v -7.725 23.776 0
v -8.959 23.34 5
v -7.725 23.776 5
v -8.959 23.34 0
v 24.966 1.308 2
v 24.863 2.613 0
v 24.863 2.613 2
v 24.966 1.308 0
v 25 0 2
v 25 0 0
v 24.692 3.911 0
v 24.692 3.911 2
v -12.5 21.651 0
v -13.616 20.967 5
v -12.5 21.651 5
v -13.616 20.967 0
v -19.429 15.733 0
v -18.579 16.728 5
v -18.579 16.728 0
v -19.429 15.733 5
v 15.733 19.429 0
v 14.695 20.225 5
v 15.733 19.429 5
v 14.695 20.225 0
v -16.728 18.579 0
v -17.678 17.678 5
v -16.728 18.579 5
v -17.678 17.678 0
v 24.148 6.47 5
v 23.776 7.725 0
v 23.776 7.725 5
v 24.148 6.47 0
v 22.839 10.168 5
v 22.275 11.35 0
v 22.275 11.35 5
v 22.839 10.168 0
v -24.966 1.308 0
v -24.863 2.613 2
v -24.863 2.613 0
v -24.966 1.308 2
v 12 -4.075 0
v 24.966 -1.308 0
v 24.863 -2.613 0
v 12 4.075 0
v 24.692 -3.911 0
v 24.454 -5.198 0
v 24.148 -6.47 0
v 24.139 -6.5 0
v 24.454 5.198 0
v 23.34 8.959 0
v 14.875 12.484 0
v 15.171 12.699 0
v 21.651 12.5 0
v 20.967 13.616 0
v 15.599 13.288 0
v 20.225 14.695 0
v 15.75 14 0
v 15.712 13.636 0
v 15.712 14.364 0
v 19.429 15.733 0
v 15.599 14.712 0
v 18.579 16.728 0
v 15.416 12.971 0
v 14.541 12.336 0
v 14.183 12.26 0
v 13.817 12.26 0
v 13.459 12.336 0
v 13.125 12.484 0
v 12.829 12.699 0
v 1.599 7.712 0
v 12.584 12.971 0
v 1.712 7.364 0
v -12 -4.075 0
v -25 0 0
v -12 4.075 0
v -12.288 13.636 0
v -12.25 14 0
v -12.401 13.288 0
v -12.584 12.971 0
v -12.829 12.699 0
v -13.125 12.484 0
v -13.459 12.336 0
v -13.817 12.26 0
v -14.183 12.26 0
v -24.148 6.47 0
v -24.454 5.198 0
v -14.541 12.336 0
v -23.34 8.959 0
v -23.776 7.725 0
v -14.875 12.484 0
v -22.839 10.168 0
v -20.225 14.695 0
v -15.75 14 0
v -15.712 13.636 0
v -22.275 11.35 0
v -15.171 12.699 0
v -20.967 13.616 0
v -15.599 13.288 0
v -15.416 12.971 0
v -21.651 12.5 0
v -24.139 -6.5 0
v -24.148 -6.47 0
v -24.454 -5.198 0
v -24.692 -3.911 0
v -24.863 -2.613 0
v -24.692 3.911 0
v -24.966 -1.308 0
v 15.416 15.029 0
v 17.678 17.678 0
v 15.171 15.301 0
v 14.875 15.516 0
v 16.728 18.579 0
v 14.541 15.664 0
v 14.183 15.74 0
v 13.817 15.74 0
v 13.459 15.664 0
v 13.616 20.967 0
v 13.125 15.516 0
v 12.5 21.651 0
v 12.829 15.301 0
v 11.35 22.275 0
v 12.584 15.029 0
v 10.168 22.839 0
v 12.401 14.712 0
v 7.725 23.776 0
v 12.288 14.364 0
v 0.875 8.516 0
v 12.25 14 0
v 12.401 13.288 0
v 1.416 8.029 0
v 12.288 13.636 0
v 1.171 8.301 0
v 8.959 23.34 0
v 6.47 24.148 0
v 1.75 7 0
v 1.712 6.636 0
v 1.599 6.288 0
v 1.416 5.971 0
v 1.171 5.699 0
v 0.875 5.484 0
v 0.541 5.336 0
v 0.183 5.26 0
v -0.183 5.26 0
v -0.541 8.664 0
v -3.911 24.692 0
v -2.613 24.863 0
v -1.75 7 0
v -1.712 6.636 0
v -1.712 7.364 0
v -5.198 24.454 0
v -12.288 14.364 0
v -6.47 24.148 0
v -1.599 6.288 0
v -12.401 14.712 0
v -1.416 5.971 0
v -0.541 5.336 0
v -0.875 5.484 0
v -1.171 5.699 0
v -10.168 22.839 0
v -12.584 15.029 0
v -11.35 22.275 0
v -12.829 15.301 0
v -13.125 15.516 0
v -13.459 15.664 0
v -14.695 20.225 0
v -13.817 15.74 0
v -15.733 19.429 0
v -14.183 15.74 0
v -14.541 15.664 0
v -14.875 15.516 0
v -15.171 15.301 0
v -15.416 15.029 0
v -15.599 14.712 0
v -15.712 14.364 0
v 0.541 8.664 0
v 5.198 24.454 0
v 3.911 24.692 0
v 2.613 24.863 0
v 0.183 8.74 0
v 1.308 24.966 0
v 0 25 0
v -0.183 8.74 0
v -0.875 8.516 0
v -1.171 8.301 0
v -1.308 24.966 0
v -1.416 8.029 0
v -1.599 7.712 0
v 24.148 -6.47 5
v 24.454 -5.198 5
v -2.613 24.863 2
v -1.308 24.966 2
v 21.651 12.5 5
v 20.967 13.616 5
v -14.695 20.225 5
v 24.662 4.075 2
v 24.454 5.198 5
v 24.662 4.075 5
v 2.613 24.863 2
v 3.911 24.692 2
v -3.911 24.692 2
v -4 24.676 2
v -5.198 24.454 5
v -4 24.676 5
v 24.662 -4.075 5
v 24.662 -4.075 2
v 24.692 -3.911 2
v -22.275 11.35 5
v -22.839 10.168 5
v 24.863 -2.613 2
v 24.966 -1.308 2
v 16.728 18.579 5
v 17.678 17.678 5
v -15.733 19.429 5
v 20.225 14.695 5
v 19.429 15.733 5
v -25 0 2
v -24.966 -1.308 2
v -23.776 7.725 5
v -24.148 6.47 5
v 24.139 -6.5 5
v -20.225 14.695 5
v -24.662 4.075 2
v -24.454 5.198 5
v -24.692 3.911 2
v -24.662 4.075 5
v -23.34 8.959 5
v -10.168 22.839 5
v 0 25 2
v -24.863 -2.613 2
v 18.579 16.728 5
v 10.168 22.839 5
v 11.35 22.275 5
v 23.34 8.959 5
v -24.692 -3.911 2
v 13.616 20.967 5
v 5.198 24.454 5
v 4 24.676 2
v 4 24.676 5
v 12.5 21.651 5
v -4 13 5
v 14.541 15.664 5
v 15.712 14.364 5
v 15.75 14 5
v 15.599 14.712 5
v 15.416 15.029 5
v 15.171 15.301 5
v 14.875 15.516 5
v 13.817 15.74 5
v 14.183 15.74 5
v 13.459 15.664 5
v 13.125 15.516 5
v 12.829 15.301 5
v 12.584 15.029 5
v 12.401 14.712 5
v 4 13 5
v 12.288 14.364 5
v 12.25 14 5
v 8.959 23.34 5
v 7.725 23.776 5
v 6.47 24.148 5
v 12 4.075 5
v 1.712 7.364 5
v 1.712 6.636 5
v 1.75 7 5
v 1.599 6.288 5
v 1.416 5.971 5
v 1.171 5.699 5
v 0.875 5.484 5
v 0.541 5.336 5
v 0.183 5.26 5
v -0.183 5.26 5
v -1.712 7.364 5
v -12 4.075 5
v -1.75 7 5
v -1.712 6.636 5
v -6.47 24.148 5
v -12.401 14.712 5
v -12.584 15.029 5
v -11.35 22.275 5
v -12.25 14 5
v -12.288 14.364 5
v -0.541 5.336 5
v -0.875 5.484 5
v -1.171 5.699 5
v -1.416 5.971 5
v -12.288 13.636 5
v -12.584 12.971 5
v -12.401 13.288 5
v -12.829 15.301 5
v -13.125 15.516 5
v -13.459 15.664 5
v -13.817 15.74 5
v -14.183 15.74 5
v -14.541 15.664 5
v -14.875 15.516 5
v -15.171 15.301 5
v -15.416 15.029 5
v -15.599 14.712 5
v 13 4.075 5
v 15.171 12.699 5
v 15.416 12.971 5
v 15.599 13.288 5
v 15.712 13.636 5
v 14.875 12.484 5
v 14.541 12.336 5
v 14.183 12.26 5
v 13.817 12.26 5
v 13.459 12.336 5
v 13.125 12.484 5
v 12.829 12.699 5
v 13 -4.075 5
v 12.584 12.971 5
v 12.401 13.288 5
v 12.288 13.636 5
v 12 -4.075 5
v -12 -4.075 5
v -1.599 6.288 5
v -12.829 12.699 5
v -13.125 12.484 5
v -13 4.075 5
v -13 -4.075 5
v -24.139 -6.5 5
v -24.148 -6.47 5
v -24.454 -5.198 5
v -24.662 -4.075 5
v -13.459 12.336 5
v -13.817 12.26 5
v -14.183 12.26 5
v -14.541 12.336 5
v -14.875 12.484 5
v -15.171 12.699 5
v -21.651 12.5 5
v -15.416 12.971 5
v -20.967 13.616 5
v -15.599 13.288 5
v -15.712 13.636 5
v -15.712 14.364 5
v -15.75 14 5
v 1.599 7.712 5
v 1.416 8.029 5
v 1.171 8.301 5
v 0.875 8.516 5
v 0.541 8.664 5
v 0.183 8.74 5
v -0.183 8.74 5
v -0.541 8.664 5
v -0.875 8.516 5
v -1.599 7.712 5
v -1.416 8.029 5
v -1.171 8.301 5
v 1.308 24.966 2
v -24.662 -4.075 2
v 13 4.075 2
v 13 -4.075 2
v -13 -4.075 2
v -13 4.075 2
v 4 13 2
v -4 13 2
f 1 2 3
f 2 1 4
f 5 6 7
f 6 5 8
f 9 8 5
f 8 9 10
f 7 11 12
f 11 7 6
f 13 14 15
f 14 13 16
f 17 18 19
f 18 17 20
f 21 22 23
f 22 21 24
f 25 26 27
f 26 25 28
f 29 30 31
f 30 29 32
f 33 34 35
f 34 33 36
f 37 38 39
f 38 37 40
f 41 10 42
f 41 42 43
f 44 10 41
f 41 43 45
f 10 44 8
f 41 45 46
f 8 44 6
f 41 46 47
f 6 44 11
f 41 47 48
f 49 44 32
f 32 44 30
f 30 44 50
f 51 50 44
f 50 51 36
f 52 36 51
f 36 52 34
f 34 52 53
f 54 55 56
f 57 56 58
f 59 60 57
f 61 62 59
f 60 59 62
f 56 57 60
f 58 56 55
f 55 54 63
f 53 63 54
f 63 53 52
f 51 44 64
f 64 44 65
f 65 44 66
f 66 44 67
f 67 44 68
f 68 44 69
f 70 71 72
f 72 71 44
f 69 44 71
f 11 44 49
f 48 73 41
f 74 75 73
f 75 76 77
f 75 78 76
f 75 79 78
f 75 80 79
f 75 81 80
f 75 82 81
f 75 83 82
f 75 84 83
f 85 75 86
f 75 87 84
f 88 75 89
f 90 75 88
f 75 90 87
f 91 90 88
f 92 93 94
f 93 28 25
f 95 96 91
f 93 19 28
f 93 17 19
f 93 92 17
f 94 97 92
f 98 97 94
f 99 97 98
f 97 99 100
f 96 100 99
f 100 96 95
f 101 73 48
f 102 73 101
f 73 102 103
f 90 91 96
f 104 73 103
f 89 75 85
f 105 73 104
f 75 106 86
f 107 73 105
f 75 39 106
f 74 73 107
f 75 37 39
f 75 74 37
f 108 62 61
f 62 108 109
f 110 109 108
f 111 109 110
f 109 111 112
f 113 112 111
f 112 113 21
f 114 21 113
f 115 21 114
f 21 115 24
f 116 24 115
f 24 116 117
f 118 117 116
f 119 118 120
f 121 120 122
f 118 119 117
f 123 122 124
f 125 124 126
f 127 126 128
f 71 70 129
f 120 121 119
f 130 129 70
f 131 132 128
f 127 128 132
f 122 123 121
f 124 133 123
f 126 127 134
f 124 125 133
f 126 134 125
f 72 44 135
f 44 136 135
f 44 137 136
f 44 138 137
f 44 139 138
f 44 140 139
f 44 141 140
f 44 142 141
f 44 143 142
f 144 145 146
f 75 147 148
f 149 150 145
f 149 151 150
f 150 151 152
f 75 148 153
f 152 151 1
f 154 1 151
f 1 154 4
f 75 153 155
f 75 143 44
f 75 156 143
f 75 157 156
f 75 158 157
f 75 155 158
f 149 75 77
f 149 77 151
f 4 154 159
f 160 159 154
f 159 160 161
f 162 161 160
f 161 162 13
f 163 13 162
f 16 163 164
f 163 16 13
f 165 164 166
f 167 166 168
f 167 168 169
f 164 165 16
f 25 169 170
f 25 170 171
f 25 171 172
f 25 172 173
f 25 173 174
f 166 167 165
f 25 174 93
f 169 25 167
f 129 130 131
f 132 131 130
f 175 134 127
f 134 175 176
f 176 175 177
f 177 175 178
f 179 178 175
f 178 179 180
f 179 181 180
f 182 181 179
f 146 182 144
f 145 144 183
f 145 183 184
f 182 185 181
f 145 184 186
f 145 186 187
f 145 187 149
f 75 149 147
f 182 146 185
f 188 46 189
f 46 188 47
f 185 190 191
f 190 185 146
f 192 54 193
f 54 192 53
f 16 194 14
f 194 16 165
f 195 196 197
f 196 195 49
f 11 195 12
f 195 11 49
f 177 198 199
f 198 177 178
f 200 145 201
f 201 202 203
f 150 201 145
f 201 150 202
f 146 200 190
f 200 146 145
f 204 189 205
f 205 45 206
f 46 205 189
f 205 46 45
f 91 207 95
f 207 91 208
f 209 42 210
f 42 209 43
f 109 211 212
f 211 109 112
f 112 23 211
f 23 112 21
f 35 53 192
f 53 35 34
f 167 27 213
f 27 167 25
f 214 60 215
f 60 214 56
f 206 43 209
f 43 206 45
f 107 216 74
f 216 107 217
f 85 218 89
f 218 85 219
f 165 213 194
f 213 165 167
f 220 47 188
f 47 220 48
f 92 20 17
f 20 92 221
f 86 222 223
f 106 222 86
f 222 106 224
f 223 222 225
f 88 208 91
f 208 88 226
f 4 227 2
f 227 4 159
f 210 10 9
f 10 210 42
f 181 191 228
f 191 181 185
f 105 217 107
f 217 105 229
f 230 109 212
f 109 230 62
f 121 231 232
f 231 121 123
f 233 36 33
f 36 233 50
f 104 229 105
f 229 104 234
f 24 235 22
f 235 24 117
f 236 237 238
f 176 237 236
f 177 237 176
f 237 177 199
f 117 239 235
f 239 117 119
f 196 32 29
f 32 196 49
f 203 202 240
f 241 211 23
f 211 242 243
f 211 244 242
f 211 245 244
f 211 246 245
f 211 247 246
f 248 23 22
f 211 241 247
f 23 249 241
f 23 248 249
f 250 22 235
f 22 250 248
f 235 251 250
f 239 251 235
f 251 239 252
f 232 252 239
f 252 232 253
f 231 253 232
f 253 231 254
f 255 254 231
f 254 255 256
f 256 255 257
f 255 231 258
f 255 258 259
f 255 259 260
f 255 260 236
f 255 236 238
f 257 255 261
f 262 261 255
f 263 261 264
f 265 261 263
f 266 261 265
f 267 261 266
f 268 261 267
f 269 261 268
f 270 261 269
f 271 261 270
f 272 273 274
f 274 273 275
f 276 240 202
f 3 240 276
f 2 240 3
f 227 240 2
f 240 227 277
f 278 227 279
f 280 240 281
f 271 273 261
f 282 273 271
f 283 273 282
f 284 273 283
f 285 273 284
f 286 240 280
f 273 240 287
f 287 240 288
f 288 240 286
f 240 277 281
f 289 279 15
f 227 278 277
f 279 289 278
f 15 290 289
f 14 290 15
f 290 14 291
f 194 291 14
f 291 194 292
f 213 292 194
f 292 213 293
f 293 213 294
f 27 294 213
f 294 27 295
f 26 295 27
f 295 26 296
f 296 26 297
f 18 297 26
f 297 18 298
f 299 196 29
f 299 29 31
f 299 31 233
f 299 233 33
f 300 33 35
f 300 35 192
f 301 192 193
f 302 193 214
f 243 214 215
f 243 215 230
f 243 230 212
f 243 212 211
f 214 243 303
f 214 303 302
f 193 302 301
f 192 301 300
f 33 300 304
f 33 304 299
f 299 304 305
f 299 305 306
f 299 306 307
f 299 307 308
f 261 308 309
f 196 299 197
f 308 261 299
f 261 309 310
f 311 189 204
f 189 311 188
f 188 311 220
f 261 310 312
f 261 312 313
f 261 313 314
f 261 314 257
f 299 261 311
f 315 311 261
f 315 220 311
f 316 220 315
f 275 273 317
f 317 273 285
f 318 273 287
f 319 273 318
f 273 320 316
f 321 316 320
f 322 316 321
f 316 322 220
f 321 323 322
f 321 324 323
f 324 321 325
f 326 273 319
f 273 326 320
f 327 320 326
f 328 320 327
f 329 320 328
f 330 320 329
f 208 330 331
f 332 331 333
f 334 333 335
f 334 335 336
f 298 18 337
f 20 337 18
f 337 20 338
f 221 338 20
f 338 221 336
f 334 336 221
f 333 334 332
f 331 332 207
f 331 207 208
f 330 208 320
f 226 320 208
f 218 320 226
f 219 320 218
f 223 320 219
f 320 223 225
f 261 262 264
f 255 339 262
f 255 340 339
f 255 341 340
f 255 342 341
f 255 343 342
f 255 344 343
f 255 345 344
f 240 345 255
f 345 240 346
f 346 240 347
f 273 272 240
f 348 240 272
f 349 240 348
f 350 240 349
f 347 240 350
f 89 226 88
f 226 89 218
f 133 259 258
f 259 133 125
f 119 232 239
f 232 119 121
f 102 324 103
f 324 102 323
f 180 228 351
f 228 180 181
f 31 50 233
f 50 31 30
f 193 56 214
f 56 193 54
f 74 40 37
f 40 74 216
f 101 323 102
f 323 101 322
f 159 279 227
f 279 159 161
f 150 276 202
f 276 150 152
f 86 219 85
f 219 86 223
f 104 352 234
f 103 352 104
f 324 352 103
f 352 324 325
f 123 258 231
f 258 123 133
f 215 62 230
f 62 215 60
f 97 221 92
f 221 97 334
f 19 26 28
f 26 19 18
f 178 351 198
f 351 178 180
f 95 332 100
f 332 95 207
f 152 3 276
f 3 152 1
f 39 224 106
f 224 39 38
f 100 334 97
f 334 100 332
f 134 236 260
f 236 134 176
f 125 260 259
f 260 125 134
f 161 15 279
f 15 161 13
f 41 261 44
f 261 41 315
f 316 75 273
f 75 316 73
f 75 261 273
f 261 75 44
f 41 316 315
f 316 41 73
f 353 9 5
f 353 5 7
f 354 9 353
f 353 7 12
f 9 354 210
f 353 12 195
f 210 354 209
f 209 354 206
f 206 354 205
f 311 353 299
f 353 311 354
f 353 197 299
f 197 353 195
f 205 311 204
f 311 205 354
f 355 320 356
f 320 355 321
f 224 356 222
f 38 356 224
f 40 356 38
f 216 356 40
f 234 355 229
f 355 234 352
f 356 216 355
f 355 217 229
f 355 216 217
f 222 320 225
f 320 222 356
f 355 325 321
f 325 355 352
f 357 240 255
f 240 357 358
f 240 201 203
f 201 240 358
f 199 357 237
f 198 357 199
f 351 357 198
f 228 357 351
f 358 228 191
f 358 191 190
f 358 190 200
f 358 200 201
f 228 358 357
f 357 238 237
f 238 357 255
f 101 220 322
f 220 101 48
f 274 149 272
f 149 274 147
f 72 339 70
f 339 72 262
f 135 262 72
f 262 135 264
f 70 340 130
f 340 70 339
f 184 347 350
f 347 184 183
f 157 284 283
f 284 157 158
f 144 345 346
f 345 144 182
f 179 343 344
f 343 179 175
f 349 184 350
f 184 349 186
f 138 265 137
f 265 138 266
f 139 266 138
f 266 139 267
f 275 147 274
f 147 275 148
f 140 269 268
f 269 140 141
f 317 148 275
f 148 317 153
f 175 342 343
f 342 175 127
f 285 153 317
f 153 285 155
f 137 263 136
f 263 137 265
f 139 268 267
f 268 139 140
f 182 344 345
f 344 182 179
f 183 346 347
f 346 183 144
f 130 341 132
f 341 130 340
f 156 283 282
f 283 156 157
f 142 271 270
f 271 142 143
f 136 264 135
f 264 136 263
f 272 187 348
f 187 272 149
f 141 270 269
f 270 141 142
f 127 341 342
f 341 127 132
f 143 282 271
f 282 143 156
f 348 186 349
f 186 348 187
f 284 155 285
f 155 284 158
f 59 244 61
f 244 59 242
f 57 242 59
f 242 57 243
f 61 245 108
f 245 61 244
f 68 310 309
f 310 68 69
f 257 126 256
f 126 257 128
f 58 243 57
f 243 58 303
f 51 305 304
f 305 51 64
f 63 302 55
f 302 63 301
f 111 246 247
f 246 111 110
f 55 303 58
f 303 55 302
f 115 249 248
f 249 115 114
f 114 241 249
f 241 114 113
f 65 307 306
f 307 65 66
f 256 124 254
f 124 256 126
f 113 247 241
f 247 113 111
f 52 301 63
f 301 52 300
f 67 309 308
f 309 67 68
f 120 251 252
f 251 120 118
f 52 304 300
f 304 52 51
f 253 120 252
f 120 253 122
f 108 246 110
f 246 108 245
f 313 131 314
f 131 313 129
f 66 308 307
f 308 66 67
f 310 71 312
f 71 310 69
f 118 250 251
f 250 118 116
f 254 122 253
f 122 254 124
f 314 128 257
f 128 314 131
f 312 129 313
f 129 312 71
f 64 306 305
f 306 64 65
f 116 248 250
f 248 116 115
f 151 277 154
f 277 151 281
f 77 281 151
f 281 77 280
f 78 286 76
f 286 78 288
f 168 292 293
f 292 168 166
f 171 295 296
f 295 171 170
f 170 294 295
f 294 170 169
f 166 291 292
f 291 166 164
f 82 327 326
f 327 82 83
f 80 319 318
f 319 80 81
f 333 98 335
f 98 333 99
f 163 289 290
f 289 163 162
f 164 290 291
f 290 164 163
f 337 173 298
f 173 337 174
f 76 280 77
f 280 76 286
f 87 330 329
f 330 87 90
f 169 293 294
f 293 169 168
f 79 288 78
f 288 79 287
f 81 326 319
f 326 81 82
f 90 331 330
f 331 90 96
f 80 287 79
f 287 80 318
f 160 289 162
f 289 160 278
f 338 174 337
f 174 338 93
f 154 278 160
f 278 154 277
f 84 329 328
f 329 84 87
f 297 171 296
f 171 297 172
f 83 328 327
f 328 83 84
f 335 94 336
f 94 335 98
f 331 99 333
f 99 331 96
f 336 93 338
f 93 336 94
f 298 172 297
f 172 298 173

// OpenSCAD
difference(){
cylinder(d=50,h=5,$fn=120);
cube([24,8.15,12],center=true);
translate([25,0,8])cube([24,8.15,12],center=true);
translate([-25,0,8])cube([24,8.15,12],center=true);
rotate([0,0,90])translate([25,0,8])
cube([24,8,12],center=true);
//rotate([0,0,-60])translate([-25,0,8])
//cube([24,8,12],center=true);
translate([0,-30.5,0])cube([54,48,12],center=true);
translate([0,7,-1])cylinder(d=3.5,h=10,$fn=30);
translate([14,14,-1])cylinder(d=3.5,h=10,$fn=30);
translate([-14,14,-1])cylinder(d=3.5,h=10,$fn=30);
}
